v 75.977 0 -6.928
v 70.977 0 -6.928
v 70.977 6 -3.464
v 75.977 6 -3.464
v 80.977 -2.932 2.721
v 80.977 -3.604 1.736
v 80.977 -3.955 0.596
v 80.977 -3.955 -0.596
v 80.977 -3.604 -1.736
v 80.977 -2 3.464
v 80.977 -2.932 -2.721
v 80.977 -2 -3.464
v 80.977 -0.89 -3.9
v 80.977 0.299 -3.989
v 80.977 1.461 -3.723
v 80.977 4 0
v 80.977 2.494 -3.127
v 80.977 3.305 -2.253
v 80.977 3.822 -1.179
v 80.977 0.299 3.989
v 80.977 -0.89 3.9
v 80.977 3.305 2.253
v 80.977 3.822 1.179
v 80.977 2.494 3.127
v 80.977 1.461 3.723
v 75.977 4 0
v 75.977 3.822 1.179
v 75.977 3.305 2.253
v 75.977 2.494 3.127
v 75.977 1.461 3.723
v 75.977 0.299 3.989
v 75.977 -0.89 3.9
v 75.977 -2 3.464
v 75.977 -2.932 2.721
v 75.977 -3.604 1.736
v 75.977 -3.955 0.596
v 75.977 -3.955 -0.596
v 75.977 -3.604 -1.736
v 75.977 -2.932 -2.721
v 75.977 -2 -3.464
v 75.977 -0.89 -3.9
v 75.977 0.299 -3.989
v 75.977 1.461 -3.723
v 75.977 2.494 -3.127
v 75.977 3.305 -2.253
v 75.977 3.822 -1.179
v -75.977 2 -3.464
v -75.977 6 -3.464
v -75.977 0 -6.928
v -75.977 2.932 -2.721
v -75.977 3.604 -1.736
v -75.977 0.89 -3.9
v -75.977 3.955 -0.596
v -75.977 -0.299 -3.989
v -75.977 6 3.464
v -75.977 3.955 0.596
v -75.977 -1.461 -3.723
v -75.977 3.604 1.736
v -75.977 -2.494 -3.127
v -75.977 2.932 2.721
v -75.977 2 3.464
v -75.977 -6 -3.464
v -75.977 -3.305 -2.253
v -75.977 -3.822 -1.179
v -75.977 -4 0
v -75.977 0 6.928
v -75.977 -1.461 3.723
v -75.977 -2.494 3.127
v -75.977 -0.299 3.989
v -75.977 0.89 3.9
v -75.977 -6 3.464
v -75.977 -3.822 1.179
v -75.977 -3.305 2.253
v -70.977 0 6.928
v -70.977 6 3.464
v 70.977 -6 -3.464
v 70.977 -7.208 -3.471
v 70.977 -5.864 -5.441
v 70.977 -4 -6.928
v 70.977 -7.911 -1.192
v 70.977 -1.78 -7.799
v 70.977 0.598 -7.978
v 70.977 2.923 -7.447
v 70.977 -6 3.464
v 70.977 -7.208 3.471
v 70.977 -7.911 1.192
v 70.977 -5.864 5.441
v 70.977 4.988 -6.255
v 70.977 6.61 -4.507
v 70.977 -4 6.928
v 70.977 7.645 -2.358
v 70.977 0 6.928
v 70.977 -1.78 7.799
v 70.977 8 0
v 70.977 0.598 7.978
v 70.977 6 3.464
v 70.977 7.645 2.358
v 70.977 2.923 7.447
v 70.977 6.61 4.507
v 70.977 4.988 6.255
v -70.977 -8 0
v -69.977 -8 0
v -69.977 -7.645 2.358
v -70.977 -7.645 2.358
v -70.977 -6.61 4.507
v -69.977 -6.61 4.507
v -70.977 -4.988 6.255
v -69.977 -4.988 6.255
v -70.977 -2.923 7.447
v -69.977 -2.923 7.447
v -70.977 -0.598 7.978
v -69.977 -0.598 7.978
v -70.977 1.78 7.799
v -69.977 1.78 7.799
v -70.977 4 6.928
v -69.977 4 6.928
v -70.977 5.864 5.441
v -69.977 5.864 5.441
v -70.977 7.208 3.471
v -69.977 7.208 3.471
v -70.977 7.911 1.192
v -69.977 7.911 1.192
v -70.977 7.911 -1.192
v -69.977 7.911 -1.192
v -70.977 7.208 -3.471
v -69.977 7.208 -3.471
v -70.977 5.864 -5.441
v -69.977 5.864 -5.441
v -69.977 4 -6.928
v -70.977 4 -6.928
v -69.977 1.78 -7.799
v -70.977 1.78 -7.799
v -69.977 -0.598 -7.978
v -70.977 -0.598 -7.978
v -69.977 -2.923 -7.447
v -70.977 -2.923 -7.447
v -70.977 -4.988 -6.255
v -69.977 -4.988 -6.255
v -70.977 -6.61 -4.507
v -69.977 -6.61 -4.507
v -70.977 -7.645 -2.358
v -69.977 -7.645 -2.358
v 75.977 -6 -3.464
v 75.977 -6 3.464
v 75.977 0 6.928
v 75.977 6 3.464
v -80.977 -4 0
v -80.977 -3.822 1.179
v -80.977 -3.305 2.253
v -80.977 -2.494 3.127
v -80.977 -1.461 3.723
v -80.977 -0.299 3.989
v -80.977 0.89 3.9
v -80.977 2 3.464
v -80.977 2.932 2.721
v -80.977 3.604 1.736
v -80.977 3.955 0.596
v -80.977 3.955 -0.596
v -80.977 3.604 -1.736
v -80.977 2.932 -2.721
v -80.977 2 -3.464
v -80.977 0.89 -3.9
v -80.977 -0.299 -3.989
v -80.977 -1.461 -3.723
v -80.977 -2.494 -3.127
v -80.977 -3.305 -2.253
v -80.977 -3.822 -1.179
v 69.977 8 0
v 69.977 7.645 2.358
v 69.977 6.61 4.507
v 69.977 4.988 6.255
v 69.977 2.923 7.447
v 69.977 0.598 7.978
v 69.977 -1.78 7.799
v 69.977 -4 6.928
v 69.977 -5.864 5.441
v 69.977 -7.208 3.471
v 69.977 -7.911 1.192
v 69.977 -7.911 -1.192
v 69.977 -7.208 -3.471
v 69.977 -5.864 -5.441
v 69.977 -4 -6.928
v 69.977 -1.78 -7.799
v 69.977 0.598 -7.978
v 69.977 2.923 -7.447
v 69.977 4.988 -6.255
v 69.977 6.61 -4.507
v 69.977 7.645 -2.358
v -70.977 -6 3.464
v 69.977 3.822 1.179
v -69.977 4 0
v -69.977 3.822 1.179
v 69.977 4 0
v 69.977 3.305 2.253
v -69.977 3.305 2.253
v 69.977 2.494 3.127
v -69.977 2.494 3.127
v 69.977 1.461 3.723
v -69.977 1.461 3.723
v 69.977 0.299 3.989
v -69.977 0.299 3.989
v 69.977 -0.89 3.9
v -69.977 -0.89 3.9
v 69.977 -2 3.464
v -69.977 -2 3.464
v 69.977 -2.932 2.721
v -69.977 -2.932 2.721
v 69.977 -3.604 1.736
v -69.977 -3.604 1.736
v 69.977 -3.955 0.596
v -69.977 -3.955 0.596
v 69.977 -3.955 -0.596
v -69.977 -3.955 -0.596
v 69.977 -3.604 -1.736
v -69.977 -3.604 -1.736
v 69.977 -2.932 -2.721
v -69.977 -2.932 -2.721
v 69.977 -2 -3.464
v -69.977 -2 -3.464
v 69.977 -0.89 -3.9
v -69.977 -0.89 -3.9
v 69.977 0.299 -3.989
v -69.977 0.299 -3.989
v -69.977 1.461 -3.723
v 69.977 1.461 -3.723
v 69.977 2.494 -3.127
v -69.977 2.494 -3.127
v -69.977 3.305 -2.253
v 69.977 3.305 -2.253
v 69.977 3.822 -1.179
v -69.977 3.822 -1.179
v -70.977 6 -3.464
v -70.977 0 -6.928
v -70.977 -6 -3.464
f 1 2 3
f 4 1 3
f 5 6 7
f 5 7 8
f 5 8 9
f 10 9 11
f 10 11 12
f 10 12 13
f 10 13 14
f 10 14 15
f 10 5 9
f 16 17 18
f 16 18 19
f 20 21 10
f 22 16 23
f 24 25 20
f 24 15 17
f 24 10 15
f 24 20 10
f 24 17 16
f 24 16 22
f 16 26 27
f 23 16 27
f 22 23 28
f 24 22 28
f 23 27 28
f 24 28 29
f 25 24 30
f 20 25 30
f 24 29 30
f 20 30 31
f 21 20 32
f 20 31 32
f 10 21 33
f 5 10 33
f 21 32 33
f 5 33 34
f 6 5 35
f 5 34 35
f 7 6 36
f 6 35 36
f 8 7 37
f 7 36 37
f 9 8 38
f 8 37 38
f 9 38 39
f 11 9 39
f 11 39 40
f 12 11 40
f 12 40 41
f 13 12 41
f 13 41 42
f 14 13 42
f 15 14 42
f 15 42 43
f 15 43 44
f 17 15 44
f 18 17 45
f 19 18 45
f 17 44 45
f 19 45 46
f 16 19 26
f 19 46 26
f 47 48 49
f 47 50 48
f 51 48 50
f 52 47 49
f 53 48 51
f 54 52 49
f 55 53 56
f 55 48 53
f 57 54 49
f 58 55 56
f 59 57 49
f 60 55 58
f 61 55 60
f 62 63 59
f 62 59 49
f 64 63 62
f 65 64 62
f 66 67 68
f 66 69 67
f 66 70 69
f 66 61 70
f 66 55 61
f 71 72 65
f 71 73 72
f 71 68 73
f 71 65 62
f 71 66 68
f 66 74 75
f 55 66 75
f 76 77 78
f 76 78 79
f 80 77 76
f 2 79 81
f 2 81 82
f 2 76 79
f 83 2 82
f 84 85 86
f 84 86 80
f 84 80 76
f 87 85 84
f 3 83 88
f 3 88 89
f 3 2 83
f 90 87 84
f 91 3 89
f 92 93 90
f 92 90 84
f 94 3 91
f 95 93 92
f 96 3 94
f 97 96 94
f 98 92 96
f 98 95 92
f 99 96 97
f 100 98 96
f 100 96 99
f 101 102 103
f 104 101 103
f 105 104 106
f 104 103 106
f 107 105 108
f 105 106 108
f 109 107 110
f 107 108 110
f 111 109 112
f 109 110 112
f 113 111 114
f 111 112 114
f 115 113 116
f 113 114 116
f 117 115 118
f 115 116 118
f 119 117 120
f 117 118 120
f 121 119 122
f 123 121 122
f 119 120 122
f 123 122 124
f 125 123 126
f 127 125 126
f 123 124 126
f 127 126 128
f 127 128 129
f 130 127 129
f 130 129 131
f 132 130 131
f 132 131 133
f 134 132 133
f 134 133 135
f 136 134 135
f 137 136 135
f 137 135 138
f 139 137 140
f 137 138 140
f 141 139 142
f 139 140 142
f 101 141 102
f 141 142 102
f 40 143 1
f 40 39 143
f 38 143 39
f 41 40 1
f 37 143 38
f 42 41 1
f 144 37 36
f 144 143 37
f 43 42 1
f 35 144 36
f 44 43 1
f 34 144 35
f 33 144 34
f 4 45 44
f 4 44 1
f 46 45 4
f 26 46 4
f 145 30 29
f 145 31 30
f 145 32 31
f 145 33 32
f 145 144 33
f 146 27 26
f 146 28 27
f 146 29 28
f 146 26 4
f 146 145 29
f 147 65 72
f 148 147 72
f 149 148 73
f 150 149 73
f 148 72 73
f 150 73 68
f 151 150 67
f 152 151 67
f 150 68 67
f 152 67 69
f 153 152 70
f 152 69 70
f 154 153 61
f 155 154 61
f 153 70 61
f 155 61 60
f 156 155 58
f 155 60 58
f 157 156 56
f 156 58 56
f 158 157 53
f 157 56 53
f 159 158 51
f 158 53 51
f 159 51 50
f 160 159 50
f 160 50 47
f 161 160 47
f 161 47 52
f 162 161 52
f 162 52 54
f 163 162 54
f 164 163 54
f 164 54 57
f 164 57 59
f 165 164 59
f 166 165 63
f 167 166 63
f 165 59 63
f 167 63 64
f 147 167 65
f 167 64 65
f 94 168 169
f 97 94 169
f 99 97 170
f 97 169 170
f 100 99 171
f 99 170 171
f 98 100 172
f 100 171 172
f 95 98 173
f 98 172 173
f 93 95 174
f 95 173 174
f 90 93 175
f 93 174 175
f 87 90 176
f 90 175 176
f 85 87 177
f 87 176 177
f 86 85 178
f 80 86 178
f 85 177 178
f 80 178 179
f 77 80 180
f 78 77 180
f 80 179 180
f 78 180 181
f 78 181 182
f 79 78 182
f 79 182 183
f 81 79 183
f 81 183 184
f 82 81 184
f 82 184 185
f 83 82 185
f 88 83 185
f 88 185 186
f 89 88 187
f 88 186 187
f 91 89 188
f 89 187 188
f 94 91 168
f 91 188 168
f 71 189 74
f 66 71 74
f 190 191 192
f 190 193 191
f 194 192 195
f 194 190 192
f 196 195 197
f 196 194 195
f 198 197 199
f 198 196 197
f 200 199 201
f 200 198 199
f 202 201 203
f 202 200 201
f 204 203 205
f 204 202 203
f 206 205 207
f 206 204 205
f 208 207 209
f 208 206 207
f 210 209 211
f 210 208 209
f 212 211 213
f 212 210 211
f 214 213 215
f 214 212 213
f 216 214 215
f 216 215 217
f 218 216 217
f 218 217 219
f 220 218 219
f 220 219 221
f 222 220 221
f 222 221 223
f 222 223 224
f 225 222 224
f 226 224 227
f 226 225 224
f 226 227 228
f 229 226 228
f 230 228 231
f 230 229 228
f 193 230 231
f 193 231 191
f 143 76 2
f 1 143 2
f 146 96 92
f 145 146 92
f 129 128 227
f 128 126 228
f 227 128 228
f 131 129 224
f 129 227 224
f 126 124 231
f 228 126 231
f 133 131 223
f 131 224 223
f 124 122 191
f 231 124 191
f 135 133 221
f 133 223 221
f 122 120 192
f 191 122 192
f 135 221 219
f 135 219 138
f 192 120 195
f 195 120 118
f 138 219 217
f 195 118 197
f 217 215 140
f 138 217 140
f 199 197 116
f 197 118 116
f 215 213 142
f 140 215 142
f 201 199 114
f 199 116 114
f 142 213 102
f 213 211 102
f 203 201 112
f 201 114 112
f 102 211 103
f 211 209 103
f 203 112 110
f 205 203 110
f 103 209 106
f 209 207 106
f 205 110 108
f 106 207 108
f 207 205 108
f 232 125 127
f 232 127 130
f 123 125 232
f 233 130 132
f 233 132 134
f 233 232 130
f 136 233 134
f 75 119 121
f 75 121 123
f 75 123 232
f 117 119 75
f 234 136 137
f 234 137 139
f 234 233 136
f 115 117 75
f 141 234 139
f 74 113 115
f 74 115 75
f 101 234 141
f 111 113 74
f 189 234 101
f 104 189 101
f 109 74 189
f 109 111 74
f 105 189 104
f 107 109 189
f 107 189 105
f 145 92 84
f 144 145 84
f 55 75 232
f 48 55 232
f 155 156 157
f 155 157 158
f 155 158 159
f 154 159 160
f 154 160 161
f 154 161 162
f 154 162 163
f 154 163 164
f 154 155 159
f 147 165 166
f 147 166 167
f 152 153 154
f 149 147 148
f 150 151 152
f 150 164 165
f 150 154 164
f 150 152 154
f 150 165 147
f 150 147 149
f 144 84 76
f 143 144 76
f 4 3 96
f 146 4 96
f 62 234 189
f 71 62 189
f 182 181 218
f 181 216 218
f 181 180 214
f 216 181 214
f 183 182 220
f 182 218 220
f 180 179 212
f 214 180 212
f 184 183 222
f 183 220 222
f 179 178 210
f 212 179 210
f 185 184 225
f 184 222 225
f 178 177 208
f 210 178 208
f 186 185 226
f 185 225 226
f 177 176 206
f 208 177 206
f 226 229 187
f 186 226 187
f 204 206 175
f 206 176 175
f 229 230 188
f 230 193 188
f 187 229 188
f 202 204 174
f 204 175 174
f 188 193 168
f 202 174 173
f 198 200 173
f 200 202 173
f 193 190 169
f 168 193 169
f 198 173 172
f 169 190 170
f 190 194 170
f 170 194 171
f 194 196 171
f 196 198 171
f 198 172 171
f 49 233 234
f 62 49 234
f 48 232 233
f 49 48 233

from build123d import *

# Parameters (mm, degrees)
F0_R      = 4
F1_DEPTH  = 69.977
F2_R      = 8
F3_DEPTH  = 1
F5_DEPTH  = 5
F6_R      = 4
F7_DEPTH  = 5
F8_R      = 8
F9_DEPTH  = 1
F11_DEPTH = 5
F12_R     = 4
F13_DEPTH = 5


with BuildPart() as f1:
    # F0 (on Right) → F1 (new body, symmetric)
    with BuildSketch(Plane.YZ):
        Circle(F0_R)
    extrude(amount=F1_DEPTH, both=True)

    # F2 (on face) → F3 (join)
    with BuildSketch(Plane.YZ.offset(69.977)):
        Circle(F2_R)
    extrude(amount=F3_DEPTH)

    # F4 (on face) → F5 (join)
    with BuildSketch(Plane.YZ.offset(70.977)):
        Polygon((6, 3.4641016151), (0, 6.9282032303), (-6, 3.4641016151), (-6, -3.4641016151), (0, -6.9282032303), (6, -3.4641016151), align=None)
    extrude(amount=F5_DEPTH)

    # F6 (on face) → F7 (join)
    with BuildSketch(Plane.YZ.offset(75.977)):
        Circle(F6_R)
    extrude(amount=F7_DEPTH)

    # F8 (on face) → F9 (join)
    with BuildSketch(Plane(origin=(-69.977, 0, 0), x_dir=(0, -1, 0), z_dir=(-1, 0, 0))):
        Circle(F8_R)
    extrude(amount=F9_DEPTH)

    # F10 (on face) → F11 (join)
    with BuildSketch(Plane(origin=(-70.977, 0, 0), x_dir=(0, -1, 0), z_dir=(-1, 0, 0))):
        Polygon((0, -6.9282032303), (6, -3.4641016151), (6, 3.4641016151), (0, 6.9282032303), (-6, 3.4641016151), (-6, -3.4641016151), align=None)
    extrude(amount=F11_DEPTH)

    # F12 (on face) → F13 (join)
    with BuildSketch(Plane(origin=(-75.977, 0, 0), x_dir=(0, -1, 0), z_dir=(-1, 0, 0))):
        Circle(F12_R)
    extrude(amount=F13_DEPTH)


solid = f1.part
